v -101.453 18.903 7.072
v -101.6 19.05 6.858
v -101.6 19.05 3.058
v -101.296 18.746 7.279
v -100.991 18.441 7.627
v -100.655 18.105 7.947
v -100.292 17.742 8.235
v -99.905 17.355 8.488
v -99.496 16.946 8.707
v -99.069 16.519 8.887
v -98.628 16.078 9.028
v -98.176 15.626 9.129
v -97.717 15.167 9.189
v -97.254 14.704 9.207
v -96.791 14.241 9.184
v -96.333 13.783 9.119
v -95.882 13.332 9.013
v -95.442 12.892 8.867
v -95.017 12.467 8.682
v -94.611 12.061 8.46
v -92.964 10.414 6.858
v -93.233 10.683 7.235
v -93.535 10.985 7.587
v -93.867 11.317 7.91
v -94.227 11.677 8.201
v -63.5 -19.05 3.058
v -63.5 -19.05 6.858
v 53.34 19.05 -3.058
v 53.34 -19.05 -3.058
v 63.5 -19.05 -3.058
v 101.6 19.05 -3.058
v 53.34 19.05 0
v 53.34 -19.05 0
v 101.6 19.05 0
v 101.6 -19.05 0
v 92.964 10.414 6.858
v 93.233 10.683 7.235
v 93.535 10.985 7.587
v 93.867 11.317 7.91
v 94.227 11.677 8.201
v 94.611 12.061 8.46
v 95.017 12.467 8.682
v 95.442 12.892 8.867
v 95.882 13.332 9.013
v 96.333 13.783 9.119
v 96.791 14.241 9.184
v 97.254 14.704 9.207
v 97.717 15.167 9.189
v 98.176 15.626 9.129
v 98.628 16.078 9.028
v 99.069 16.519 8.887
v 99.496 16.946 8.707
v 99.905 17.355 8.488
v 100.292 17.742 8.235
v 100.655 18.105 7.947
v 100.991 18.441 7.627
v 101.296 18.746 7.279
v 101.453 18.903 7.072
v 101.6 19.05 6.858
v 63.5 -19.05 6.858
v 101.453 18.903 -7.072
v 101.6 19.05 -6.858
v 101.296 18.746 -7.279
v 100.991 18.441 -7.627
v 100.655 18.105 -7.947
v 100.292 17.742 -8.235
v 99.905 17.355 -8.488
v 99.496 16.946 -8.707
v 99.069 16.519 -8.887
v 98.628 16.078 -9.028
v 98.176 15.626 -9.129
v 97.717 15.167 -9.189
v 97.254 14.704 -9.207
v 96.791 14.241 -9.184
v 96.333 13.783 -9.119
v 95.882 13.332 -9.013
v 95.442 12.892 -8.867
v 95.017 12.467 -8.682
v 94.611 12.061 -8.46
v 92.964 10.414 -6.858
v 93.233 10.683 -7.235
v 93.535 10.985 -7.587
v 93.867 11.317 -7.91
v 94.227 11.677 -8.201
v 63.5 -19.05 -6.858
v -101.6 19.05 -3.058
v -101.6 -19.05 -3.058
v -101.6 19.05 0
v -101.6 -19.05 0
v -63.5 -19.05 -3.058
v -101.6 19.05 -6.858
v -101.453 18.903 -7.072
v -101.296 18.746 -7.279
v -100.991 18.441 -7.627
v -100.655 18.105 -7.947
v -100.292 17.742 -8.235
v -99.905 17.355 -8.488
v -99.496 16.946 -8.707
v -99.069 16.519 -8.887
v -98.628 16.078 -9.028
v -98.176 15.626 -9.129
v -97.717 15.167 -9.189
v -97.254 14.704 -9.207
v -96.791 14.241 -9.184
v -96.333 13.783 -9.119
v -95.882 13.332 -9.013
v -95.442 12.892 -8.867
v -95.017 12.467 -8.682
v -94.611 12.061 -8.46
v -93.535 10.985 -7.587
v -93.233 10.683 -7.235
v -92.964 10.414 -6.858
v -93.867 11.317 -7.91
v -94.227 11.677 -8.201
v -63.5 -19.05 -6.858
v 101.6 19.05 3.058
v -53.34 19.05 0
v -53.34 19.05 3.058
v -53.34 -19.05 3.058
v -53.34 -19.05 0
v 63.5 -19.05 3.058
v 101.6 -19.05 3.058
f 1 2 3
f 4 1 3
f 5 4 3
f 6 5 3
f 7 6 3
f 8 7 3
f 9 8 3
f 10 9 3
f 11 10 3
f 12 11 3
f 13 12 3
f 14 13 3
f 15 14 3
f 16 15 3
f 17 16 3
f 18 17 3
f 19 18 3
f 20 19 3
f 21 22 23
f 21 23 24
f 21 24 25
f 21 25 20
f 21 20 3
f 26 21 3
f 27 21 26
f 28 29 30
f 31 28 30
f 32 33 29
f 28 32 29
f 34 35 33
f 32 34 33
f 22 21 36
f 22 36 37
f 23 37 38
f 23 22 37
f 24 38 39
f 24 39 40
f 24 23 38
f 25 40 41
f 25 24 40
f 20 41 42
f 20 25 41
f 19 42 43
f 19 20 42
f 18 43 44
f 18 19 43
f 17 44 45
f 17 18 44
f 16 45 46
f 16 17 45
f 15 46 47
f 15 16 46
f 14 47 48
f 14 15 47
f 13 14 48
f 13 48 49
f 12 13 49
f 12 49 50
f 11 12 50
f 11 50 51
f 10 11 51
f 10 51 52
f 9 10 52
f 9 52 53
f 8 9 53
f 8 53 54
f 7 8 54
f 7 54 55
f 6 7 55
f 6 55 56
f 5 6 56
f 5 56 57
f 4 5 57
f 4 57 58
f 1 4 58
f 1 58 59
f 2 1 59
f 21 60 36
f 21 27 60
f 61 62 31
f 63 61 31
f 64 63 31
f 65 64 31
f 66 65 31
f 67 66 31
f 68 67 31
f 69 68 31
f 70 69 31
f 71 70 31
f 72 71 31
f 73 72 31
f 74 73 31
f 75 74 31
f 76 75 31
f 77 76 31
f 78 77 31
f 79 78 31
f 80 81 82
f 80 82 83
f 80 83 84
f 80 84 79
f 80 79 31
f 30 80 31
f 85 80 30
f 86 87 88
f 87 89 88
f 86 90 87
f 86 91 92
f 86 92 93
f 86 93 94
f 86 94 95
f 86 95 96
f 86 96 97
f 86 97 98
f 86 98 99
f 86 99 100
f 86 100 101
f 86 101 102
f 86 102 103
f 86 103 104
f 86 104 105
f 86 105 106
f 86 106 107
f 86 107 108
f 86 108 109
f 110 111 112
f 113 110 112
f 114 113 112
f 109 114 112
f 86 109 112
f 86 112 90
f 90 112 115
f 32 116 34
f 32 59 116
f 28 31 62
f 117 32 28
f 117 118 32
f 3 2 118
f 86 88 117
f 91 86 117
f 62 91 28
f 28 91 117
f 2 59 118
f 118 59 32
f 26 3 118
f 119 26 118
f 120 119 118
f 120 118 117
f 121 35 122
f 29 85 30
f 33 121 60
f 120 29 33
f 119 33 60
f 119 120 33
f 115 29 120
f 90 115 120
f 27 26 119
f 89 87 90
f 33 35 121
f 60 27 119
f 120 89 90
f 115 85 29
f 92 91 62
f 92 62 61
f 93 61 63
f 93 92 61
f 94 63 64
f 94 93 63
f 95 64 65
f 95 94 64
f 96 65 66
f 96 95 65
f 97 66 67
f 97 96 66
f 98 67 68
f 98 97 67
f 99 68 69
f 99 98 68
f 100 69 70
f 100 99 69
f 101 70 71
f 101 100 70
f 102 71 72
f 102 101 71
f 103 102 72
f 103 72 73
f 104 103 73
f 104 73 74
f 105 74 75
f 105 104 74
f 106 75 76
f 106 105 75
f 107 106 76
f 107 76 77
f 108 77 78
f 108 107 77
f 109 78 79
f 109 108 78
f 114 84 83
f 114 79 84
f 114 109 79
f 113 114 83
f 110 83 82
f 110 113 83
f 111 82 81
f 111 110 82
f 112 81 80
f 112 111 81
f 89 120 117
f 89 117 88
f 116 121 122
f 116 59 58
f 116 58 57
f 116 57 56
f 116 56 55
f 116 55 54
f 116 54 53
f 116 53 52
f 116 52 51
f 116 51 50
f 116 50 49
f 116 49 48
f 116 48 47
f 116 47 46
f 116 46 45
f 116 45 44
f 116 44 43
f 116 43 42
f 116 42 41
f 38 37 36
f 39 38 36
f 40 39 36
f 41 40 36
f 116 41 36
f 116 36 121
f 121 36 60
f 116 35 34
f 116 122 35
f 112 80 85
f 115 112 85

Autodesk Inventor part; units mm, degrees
ref_plane "YZ Plane" through (0, 0, 0) normal (1, 0, 0) x (0, 1, 0)
sketch "Sketch1" plane through (0, 0, 0) normal (1, 0, 0) x (0, 1, 0)
  line L0 (-19.05, 6.858) -> (19.05, 6.858)
  line L1 (19.05, 6.858) -> (19.05, -6.858)
  line L2 (19.05, -6.858) -> (-19.05, -6.858)
  line L3 (-19.05, -6.858) -> (-19.05, 6.858)
  line L4 (-19.05, 6.858) -> (19.05, -6.858) construction
  line L5 (19.05, 6.858) -> (-19.05, -6.858) construction
  arc A0 (19.05, 6.858) -> (10.414, 6.858) centre (14.732, 4.0649) ccw
  arc A1 (10.414, -6.858) -> (19.05, -6.858) centre (14.732, -4.0649) ccw
  line L6 (14.732, 9.2075) -> (14.732, -9.2075)
  point P0 (0, 0)
  dimension "d0" = 38.1
  dimension "d1" = 13.716
  dimension "d6" = 8.636
  dimension "d8" = 8.636
  dimension "d9" = 18.415
extrude "Extrusion1" add sketch "Sketch1" along normal mid plane 203.2
sketch "Sketch3" plane through (-101.6, -19.05, -6.858) normal (0, -1, 0) x (1, 0, 0)
  line L0 (0, 0) -> (203.2, 0) projected
  line L1 (203.2, 13.716) -> (203.2, 0) projected
  line L2 (203.2, 13.716) -> (0, 13.716) projected
  line L3 (0, 0) -> (0, 13.716) projected
  line L4 (203.2, 6.858) -> (154.94, 6.858)
  line L5 (154.94, 6.858) -> (154.94, 3.8)
  line L6 (154.94, 3.8) -> (203.2, 3.8)
  line L7 (203.2, 3.8) -> (203.2, 6.858)
  line L8 (154.94, 6.858) -> (203.2, 6.858)
  line L9 (203.2, 6.858) -> (203.2, 9.916)
  line L10 (0, 9.916) -> (48.26, 9.916)
  line L11 (48.26, 9.916) -> (48.26, 6.858)
  line L12 (48.26, 6.858) -> (0, 6.858)
  line L13 (0, 6.858) -> (0, 9.916)
  point P0 (101.6, 6.858)
  dimension "d14" = 48.26
  dimension "d19" = 3.8
  dimension "d21" = 3.058
  dimension "d22" = 48.26
  dimension "d23" = 3.8
  dimension "d24" = 3.058
extrude "Extrusion3" cut sketch "Sketch3" against normal through all contours L3 L10 L11 L12 | L6 L5 L4 L1
ref_plane "Work Plane1" through (-101.6, 10.414, 26.858) normal (0, 0, 1) x (1, 0, 0)
sketch "Sketch4" plane through (-101.6, 10.414, 26.858) normal (0, 0, 1) x (1, 0, 0)
  line L0 (0, 0) -> (203.2, 0) projected
  line L1 (0, -29.464) -> (0, 0) projected
  line L2 (203.2, -29.464) -> (0, -29.464) projected
  line L3 (203.2, 0) -> (203.2, -29.464) projected
  line L4 (0, 0) -> (203.2, 0) projected
  line L5 (203.2, 8.636) -> (203.2, 0) projected
  line L6 (0, 8.636) -> (203.2, 8.636) projected
  line L7 (0, 0) -> (0, 8.636) projected
  line L8 (203.2, 8.636) -> (165.1, -29.464)
  line L9 (0, 8.636) -> (38.1, -29.464)
  line L10 (203.2, 8.636) -> (203.2, -29.464)
  line L11 (165.1, -29.464) -> (203.2, -29.464)
  line L12 (38.1, -29.464) -> (0, -29.464)
  line L13 (0, 8.636) -> (0, -29.464)
  point P0 (101.6, -10.414)
  dimension "d28" = 45
  dimension "d29" = 45
extrude "Extrusion4" cut sketch "Sketch4" against normal blind 23.8 contours L7 L9 L0 | L0 L9 L2 L1 | L8 L5 L0 | L0 L3 L2 L8
ref_plane "Work Plane2" through (101.6, 10.414, -26.858) normal (0, 0, -1) x (-1, 0, 0)
sketch "Sketch5" plane through (101.6, 10.414, -26.858) normal (0, 0, -1) x (-1, 0, 0)
  line L0 (203.2, 0) -> (0, 0) projected
  line L1 (0, -29.464) -> (0, 0) projected
  line L2 (203.2, -29.464) -> (0, -29.464) projected
  line L3 (203.2, 0) -> (203.2, -29.464) projected
  line L4 (0, 8.636) -> (203.2, 8.636) projected
  line L5 (0, 0) -> (0, 8.636) projected
  line L6 (203.2, 0) -> (0, 0) projected
  line L7 (203.2, 8.636) -> (203.2, 0) projected
  line L8 (0, 8.636) -> (38.1, -29.464)
  line L9 (203.2, 8.636) -> (165.1, -29.464)
  line L10 (165.1, -29.464) -> (203.2, -29.464)
  line L11 (203.2, -29.464) -> (203.2, 8.636)
  line L12 (38.1, -29.464) -> (0, -29.464)
  line L13 (0, -29.464) -> (0, 8.636)
  point P0 (101.6, -10.414)
  dimension "d33" = 45
  dimension "d34" = 45
extrude "Extrusion5" cut sketch "Sketch5" against normal blind 23.8 contours L3 L2 L9 L0 | L0 L9 L7 | L8 L2 L1 L0 | L0 L5 L8
equation "\"d14\" = SlotDepth"
equation "\"d19\" = SlotOffset"
equation "\"d21\" = SlotWidth"
equation "\"d22\" = SlotDepth"
equation "\"d23\" = SlotOffset"
equation "\"d24\" = SlotWidth"
equation "\"d0\" = StretcherHeight"
equation "\"d1\" = StretcherDepth"
equation "\"d6\" = RoundoverDiameter"
equation "\"d8\" = d6"
equation "\"SlotDepth\" = 48.26"
equation "\"SlotOffset\" = 3.8"
equation "\"SlotWidth\" = 3.058"
equation "\"StretcherHeight\" = 38.1"
equation "\"StretcherDepth\" = 13.716"
equation "\"RoundoverDiameter\" = 8.636"
properties part number "Stretcher-08" material "Wood (Birch)"
